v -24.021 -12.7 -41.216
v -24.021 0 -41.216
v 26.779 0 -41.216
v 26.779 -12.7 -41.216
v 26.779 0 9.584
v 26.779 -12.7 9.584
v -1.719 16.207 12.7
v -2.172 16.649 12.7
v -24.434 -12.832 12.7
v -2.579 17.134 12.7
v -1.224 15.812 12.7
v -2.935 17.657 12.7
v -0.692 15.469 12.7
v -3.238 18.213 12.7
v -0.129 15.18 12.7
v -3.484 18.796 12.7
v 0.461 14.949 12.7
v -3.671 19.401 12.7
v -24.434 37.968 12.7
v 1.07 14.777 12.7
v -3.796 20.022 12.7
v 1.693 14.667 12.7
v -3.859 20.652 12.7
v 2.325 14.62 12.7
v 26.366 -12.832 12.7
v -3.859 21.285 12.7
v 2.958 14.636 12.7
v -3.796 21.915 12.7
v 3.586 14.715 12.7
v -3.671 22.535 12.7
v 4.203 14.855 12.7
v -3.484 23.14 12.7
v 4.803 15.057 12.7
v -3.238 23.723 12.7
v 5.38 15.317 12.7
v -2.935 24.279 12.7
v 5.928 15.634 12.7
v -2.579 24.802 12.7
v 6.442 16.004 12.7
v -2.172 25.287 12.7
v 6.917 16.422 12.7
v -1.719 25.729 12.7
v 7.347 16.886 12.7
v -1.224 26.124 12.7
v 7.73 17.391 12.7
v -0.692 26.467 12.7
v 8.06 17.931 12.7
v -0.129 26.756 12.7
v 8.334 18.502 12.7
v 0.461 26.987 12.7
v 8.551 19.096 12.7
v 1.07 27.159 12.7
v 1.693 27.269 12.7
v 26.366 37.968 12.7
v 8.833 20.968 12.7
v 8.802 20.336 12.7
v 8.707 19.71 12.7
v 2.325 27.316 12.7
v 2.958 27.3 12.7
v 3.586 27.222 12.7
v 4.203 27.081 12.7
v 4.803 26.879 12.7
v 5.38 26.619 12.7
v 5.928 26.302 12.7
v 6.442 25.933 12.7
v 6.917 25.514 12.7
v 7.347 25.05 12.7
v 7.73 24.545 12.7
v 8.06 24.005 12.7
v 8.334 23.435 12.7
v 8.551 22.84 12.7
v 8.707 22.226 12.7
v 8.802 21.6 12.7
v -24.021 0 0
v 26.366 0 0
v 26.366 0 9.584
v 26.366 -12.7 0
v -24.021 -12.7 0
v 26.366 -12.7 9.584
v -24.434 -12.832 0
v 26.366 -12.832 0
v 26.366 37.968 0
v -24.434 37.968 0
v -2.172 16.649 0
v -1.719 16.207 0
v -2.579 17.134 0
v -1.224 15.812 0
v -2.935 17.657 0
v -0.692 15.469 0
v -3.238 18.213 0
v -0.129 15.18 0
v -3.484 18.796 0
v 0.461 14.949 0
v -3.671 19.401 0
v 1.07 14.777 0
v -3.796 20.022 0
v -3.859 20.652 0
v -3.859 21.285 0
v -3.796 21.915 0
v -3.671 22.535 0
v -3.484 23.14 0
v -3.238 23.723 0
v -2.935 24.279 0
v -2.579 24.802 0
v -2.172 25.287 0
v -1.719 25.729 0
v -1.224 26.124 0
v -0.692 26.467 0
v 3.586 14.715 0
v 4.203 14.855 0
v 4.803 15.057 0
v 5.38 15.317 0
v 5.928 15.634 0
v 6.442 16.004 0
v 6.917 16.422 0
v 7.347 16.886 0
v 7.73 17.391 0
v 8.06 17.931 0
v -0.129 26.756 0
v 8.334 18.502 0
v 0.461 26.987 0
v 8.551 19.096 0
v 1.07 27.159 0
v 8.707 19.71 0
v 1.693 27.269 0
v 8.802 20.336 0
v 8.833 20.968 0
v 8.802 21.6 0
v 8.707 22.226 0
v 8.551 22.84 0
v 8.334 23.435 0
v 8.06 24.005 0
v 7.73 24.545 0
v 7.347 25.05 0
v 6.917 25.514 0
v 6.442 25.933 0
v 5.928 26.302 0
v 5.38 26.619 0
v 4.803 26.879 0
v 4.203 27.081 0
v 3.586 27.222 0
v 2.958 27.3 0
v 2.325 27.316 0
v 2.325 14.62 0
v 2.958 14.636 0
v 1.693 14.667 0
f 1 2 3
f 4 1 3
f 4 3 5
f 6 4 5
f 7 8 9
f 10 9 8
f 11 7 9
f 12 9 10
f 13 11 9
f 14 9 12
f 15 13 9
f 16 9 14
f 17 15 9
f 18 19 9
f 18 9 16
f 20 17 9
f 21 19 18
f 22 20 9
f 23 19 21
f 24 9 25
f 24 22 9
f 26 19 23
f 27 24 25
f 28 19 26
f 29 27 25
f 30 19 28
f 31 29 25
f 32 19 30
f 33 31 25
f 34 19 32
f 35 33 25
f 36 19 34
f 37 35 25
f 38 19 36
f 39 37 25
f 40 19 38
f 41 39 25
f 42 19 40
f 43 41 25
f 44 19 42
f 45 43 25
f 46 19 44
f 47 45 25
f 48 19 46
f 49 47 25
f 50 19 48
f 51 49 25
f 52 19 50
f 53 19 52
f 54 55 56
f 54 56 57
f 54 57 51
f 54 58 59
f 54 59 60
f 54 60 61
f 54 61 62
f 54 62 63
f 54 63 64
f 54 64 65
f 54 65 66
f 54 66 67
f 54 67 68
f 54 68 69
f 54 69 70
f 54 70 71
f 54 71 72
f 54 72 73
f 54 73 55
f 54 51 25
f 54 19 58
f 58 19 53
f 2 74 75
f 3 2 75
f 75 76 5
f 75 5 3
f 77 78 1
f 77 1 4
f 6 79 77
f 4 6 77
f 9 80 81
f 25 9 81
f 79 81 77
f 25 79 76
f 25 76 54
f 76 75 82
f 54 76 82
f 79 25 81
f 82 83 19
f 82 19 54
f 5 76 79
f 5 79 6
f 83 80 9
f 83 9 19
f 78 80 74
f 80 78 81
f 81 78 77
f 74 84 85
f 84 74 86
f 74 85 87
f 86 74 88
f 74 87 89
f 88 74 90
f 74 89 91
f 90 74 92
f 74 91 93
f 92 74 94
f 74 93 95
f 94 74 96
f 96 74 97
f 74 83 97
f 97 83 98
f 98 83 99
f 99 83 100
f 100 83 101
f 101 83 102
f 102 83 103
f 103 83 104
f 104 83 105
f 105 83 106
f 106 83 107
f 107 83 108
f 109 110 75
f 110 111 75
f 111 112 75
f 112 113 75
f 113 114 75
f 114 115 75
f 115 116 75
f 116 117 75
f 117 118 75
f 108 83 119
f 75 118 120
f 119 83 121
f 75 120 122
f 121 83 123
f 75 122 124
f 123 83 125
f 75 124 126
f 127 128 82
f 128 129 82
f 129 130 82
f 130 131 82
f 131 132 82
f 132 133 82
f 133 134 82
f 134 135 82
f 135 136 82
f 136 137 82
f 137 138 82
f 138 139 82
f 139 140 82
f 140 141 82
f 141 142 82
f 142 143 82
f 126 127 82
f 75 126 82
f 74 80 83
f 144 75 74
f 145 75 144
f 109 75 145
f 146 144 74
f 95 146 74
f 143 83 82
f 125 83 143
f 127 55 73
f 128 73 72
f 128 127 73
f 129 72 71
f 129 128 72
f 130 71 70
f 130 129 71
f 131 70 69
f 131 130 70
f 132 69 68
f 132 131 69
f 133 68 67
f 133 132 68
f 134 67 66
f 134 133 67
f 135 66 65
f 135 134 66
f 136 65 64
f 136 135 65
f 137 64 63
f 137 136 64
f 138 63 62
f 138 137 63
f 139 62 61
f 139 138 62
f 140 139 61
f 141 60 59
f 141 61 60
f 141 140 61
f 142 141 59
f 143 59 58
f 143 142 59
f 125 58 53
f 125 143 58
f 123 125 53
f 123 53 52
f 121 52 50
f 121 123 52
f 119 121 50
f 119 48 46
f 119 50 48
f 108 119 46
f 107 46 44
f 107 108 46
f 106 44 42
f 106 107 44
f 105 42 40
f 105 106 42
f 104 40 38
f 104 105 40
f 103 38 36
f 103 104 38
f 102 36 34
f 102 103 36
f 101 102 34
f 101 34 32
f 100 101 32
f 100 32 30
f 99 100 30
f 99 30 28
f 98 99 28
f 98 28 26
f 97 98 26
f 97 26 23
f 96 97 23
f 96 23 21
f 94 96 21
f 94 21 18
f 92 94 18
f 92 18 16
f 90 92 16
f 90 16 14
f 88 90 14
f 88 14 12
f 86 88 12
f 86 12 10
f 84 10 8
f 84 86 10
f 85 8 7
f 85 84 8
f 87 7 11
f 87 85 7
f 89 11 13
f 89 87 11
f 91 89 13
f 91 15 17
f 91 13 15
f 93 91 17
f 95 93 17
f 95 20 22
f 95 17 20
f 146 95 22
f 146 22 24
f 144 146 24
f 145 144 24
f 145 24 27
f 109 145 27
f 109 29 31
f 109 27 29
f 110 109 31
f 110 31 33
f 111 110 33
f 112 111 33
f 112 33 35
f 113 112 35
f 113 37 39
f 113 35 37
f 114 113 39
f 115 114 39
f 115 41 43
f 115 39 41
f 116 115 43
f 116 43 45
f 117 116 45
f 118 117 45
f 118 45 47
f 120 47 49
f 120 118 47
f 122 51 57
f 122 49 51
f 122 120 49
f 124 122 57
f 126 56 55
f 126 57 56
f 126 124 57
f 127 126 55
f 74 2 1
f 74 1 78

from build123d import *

# Parameters (mm, degrees)
F0_W     = 50.8
F0_H     = 50.8
F1_DEPTH = 12.7
F2_W     = 50.8
F2_H     = 50.8
F3_DEPTH = 12.7
F4_R     = 6.35
F5_DEPTH = 25.4


with BuildPart() as f1:
    # F0 (on Front) → F1 (new body)
    with BuildSketch(Plane.XZ):
        with Locations((1.379482, -15.815881)):
            Rectangle(F0_W, F0_H)
    extrude(amount=F1_DEPTH)

    # F2 (on Top) → F3 (join)
    with BuildSketch(Plane.XY):
        with Locations((0.965637, 12.567736)):
            Rectangle(F2_W, F2_H)
    extrude(amount=F3_DEPTH)

    # F4 (on face) → F5 (cut)
    with BuildSketch(Plane.XY):
        with Locations((2.483068, 20.968137)):
            Circle(F4_R)
    extrude(amount=F5_DEPTH, mode=Mode.SUBTRACT)


solid = f1.part
